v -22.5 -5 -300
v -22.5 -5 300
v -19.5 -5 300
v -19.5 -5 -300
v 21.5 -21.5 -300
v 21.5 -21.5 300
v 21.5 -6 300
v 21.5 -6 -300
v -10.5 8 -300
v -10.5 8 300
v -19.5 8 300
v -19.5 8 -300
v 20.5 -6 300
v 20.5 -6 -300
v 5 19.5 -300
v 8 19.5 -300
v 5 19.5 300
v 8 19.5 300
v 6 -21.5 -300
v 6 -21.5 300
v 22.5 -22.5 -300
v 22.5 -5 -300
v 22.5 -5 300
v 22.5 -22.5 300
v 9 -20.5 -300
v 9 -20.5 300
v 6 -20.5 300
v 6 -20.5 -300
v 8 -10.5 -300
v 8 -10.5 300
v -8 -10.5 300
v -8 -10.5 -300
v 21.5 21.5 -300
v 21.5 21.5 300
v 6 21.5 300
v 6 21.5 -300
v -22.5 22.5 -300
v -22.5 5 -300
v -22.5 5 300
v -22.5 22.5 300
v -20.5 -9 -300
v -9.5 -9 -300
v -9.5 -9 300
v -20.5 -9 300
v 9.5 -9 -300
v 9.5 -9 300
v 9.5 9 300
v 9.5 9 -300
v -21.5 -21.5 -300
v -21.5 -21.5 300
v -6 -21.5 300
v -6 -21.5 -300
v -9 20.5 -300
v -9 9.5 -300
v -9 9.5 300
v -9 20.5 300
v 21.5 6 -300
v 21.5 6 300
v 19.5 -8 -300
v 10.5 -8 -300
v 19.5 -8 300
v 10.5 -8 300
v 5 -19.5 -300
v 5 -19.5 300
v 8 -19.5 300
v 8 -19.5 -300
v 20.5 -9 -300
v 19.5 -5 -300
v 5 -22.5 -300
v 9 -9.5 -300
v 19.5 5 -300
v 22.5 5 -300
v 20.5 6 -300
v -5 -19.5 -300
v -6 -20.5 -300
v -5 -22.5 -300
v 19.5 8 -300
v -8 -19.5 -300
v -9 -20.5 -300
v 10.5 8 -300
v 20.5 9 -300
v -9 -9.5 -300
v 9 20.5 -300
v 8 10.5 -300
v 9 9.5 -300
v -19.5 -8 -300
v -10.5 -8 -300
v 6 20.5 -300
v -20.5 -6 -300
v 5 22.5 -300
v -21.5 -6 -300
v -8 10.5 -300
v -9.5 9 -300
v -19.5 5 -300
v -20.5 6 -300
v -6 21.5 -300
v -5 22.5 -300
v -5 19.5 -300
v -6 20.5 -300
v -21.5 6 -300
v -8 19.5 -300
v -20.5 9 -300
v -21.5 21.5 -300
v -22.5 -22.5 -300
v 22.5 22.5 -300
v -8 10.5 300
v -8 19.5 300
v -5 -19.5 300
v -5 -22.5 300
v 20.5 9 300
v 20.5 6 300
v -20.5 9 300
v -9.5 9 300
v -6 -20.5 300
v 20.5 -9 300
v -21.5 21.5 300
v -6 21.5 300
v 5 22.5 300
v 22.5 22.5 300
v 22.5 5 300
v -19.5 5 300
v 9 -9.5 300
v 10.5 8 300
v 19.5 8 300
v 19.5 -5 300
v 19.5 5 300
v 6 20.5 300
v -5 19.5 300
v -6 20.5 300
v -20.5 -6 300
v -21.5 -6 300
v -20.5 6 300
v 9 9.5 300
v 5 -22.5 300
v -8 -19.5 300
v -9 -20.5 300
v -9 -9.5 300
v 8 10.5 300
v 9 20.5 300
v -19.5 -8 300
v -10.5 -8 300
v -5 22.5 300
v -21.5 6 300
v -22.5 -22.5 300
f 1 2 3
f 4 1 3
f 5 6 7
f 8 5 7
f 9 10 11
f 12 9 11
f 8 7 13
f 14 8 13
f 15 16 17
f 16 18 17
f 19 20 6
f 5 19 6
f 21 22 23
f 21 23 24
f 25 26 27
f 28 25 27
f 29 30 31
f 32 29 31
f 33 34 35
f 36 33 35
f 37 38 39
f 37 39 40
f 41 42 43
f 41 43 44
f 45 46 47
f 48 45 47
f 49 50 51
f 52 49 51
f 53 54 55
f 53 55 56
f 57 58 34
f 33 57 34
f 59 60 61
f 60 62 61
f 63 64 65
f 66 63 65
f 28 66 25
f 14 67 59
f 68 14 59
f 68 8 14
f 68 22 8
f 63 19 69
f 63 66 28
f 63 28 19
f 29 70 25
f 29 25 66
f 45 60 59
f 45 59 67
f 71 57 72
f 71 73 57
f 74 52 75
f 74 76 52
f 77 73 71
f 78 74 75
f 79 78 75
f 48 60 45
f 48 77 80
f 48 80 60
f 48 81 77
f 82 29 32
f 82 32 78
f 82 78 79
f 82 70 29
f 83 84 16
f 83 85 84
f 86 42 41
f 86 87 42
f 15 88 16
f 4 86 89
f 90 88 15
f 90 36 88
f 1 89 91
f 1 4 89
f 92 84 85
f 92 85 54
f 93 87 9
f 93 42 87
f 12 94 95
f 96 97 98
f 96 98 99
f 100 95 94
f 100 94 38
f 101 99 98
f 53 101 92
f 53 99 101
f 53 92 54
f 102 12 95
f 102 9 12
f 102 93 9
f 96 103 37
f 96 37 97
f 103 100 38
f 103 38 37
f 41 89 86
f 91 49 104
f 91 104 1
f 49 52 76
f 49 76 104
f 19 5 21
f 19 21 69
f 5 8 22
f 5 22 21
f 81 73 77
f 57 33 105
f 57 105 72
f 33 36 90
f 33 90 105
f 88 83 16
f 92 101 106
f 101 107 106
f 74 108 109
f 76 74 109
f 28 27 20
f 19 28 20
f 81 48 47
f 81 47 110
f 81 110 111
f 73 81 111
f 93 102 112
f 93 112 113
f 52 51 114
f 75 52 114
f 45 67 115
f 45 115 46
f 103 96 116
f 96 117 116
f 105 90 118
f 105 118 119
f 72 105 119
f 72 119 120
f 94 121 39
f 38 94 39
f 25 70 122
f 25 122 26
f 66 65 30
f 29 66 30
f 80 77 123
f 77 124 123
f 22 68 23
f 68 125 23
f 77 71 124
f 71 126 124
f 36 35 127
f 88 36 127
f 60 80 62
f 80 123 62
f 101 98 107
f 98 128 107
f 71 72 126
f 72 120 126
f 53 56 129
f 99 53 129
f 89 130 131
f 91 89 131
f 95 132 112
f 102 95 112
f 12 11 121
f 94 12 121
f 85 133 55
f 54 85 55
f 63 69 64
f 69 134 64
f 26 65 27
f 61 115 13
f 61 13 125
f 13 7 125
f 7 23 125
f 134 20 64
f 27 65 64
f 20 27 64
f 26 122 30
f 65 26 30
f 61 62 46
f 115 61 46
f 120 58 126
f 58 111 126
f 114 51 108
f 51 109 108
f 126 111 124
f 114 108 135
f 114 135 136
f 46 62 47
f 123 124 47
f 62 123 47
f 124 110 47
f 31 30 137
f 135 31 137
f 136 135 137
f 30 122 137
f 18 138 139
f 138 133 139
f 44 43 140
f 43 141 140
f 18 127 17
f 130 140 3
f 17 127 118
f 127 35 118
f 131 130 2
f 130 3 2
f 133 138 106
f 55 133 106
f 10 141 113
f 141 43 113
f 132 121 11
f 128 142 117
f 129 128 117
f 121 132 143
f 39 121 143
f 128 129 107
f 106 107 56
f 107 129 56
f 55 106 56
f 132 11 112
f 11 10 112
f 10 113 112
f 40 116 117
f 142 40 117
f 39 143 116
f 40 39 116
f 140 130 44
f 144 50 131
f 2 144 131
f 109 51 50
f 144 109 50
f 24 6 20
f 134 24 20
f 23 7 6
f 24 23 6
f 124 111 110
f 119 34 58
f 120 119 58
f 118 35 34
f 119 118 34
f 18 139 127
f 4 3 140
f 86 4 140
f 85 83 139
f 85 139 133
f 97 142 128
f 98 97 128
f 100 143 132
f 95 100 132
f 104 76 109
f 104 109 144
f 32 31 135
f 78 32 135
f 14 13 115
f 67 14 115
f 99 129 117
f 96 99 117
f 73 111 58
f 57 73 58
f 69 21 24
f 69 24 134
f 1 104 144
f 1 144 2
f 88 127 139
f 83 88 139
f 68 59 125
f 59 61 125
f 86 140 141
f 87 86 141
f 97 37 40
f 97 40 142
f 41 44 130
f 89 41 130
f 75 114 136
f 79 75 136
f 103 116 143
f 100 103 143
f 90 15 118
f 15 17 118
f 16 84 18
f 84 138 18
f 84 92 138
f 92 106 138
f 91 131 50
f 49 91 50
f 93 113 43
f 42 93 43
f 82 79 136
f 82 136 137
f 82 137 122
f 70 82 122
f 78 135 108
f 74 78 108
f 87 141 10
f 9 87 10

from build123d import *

# Parameters (mm, degrees)
BOSS_EXTRUDE2_DEPTH = 300


with BuildPart() as part:
    # Sketch1 → Boss-Extrude2 (new, symmetric)
    with BuildSketch(Plane.XY):
        Polygon((-5, 22.5), (-5, 19.5), (-8, 19.5), (-8, 10.5), (8, 10.5), (8, 19.5), (5, 19.5), (5, 22.5), (22.5, 22.5), (22.5, 5), (19.5, 5), (19.5, 8), (10.5, 8), (10.5, -8), (19.5, -8), (19.5, -5), (22.5, -5), (22.5, -22.5), (5, -22.5), (5, -19.5), (8, -19.5), (8, -10.5), (-8, -10.5), (-8, -19.5), (-5, -19.5), (-5, -22.5), (-22.5, -22.5), (-22.5, -5), (-19.5, -5), (-19.5, -8), (-10.5, -8), (-10.5, 8), (-19.5, 8), (-19.5, 5), (-22.5, 5), (-22.5, 22.5), align=None)
        Polygon((-6, 21.5), (-21.5, 21.5), (-21.5, 6), (-20.5, 6), (-20.5, 9), (-9.5, 9), (-9.5, -9), (-20.5, -9), (-20.5, -6), (-21.5, -6), (-21.5, -21.5), (-6, -21.5), (-6, -20.5), (-9, -20.5), (-9, -9.5), (9, -9.5), (9, -20.5), (6, -20.5), (6, -21.5), (21.5, -21.5), (21.5, -6), (20.5, -6), (20.5, -9), (9.5, -9), (9.5, 9), (20.5, 9), (20.5, 6), (21.5, 6), (21.5, 21.5), (6, 21.5), (6, 20.5), (9, 20.5), (9, 9.5), (-9, 9.5), (-9, 20.5), (-6, 20.5), align=None, mode=Mode.SUBTRACT)
    extrude(amount=BOSS_EXTRUDE2_DEPTH, both=True)


solid = part.part
